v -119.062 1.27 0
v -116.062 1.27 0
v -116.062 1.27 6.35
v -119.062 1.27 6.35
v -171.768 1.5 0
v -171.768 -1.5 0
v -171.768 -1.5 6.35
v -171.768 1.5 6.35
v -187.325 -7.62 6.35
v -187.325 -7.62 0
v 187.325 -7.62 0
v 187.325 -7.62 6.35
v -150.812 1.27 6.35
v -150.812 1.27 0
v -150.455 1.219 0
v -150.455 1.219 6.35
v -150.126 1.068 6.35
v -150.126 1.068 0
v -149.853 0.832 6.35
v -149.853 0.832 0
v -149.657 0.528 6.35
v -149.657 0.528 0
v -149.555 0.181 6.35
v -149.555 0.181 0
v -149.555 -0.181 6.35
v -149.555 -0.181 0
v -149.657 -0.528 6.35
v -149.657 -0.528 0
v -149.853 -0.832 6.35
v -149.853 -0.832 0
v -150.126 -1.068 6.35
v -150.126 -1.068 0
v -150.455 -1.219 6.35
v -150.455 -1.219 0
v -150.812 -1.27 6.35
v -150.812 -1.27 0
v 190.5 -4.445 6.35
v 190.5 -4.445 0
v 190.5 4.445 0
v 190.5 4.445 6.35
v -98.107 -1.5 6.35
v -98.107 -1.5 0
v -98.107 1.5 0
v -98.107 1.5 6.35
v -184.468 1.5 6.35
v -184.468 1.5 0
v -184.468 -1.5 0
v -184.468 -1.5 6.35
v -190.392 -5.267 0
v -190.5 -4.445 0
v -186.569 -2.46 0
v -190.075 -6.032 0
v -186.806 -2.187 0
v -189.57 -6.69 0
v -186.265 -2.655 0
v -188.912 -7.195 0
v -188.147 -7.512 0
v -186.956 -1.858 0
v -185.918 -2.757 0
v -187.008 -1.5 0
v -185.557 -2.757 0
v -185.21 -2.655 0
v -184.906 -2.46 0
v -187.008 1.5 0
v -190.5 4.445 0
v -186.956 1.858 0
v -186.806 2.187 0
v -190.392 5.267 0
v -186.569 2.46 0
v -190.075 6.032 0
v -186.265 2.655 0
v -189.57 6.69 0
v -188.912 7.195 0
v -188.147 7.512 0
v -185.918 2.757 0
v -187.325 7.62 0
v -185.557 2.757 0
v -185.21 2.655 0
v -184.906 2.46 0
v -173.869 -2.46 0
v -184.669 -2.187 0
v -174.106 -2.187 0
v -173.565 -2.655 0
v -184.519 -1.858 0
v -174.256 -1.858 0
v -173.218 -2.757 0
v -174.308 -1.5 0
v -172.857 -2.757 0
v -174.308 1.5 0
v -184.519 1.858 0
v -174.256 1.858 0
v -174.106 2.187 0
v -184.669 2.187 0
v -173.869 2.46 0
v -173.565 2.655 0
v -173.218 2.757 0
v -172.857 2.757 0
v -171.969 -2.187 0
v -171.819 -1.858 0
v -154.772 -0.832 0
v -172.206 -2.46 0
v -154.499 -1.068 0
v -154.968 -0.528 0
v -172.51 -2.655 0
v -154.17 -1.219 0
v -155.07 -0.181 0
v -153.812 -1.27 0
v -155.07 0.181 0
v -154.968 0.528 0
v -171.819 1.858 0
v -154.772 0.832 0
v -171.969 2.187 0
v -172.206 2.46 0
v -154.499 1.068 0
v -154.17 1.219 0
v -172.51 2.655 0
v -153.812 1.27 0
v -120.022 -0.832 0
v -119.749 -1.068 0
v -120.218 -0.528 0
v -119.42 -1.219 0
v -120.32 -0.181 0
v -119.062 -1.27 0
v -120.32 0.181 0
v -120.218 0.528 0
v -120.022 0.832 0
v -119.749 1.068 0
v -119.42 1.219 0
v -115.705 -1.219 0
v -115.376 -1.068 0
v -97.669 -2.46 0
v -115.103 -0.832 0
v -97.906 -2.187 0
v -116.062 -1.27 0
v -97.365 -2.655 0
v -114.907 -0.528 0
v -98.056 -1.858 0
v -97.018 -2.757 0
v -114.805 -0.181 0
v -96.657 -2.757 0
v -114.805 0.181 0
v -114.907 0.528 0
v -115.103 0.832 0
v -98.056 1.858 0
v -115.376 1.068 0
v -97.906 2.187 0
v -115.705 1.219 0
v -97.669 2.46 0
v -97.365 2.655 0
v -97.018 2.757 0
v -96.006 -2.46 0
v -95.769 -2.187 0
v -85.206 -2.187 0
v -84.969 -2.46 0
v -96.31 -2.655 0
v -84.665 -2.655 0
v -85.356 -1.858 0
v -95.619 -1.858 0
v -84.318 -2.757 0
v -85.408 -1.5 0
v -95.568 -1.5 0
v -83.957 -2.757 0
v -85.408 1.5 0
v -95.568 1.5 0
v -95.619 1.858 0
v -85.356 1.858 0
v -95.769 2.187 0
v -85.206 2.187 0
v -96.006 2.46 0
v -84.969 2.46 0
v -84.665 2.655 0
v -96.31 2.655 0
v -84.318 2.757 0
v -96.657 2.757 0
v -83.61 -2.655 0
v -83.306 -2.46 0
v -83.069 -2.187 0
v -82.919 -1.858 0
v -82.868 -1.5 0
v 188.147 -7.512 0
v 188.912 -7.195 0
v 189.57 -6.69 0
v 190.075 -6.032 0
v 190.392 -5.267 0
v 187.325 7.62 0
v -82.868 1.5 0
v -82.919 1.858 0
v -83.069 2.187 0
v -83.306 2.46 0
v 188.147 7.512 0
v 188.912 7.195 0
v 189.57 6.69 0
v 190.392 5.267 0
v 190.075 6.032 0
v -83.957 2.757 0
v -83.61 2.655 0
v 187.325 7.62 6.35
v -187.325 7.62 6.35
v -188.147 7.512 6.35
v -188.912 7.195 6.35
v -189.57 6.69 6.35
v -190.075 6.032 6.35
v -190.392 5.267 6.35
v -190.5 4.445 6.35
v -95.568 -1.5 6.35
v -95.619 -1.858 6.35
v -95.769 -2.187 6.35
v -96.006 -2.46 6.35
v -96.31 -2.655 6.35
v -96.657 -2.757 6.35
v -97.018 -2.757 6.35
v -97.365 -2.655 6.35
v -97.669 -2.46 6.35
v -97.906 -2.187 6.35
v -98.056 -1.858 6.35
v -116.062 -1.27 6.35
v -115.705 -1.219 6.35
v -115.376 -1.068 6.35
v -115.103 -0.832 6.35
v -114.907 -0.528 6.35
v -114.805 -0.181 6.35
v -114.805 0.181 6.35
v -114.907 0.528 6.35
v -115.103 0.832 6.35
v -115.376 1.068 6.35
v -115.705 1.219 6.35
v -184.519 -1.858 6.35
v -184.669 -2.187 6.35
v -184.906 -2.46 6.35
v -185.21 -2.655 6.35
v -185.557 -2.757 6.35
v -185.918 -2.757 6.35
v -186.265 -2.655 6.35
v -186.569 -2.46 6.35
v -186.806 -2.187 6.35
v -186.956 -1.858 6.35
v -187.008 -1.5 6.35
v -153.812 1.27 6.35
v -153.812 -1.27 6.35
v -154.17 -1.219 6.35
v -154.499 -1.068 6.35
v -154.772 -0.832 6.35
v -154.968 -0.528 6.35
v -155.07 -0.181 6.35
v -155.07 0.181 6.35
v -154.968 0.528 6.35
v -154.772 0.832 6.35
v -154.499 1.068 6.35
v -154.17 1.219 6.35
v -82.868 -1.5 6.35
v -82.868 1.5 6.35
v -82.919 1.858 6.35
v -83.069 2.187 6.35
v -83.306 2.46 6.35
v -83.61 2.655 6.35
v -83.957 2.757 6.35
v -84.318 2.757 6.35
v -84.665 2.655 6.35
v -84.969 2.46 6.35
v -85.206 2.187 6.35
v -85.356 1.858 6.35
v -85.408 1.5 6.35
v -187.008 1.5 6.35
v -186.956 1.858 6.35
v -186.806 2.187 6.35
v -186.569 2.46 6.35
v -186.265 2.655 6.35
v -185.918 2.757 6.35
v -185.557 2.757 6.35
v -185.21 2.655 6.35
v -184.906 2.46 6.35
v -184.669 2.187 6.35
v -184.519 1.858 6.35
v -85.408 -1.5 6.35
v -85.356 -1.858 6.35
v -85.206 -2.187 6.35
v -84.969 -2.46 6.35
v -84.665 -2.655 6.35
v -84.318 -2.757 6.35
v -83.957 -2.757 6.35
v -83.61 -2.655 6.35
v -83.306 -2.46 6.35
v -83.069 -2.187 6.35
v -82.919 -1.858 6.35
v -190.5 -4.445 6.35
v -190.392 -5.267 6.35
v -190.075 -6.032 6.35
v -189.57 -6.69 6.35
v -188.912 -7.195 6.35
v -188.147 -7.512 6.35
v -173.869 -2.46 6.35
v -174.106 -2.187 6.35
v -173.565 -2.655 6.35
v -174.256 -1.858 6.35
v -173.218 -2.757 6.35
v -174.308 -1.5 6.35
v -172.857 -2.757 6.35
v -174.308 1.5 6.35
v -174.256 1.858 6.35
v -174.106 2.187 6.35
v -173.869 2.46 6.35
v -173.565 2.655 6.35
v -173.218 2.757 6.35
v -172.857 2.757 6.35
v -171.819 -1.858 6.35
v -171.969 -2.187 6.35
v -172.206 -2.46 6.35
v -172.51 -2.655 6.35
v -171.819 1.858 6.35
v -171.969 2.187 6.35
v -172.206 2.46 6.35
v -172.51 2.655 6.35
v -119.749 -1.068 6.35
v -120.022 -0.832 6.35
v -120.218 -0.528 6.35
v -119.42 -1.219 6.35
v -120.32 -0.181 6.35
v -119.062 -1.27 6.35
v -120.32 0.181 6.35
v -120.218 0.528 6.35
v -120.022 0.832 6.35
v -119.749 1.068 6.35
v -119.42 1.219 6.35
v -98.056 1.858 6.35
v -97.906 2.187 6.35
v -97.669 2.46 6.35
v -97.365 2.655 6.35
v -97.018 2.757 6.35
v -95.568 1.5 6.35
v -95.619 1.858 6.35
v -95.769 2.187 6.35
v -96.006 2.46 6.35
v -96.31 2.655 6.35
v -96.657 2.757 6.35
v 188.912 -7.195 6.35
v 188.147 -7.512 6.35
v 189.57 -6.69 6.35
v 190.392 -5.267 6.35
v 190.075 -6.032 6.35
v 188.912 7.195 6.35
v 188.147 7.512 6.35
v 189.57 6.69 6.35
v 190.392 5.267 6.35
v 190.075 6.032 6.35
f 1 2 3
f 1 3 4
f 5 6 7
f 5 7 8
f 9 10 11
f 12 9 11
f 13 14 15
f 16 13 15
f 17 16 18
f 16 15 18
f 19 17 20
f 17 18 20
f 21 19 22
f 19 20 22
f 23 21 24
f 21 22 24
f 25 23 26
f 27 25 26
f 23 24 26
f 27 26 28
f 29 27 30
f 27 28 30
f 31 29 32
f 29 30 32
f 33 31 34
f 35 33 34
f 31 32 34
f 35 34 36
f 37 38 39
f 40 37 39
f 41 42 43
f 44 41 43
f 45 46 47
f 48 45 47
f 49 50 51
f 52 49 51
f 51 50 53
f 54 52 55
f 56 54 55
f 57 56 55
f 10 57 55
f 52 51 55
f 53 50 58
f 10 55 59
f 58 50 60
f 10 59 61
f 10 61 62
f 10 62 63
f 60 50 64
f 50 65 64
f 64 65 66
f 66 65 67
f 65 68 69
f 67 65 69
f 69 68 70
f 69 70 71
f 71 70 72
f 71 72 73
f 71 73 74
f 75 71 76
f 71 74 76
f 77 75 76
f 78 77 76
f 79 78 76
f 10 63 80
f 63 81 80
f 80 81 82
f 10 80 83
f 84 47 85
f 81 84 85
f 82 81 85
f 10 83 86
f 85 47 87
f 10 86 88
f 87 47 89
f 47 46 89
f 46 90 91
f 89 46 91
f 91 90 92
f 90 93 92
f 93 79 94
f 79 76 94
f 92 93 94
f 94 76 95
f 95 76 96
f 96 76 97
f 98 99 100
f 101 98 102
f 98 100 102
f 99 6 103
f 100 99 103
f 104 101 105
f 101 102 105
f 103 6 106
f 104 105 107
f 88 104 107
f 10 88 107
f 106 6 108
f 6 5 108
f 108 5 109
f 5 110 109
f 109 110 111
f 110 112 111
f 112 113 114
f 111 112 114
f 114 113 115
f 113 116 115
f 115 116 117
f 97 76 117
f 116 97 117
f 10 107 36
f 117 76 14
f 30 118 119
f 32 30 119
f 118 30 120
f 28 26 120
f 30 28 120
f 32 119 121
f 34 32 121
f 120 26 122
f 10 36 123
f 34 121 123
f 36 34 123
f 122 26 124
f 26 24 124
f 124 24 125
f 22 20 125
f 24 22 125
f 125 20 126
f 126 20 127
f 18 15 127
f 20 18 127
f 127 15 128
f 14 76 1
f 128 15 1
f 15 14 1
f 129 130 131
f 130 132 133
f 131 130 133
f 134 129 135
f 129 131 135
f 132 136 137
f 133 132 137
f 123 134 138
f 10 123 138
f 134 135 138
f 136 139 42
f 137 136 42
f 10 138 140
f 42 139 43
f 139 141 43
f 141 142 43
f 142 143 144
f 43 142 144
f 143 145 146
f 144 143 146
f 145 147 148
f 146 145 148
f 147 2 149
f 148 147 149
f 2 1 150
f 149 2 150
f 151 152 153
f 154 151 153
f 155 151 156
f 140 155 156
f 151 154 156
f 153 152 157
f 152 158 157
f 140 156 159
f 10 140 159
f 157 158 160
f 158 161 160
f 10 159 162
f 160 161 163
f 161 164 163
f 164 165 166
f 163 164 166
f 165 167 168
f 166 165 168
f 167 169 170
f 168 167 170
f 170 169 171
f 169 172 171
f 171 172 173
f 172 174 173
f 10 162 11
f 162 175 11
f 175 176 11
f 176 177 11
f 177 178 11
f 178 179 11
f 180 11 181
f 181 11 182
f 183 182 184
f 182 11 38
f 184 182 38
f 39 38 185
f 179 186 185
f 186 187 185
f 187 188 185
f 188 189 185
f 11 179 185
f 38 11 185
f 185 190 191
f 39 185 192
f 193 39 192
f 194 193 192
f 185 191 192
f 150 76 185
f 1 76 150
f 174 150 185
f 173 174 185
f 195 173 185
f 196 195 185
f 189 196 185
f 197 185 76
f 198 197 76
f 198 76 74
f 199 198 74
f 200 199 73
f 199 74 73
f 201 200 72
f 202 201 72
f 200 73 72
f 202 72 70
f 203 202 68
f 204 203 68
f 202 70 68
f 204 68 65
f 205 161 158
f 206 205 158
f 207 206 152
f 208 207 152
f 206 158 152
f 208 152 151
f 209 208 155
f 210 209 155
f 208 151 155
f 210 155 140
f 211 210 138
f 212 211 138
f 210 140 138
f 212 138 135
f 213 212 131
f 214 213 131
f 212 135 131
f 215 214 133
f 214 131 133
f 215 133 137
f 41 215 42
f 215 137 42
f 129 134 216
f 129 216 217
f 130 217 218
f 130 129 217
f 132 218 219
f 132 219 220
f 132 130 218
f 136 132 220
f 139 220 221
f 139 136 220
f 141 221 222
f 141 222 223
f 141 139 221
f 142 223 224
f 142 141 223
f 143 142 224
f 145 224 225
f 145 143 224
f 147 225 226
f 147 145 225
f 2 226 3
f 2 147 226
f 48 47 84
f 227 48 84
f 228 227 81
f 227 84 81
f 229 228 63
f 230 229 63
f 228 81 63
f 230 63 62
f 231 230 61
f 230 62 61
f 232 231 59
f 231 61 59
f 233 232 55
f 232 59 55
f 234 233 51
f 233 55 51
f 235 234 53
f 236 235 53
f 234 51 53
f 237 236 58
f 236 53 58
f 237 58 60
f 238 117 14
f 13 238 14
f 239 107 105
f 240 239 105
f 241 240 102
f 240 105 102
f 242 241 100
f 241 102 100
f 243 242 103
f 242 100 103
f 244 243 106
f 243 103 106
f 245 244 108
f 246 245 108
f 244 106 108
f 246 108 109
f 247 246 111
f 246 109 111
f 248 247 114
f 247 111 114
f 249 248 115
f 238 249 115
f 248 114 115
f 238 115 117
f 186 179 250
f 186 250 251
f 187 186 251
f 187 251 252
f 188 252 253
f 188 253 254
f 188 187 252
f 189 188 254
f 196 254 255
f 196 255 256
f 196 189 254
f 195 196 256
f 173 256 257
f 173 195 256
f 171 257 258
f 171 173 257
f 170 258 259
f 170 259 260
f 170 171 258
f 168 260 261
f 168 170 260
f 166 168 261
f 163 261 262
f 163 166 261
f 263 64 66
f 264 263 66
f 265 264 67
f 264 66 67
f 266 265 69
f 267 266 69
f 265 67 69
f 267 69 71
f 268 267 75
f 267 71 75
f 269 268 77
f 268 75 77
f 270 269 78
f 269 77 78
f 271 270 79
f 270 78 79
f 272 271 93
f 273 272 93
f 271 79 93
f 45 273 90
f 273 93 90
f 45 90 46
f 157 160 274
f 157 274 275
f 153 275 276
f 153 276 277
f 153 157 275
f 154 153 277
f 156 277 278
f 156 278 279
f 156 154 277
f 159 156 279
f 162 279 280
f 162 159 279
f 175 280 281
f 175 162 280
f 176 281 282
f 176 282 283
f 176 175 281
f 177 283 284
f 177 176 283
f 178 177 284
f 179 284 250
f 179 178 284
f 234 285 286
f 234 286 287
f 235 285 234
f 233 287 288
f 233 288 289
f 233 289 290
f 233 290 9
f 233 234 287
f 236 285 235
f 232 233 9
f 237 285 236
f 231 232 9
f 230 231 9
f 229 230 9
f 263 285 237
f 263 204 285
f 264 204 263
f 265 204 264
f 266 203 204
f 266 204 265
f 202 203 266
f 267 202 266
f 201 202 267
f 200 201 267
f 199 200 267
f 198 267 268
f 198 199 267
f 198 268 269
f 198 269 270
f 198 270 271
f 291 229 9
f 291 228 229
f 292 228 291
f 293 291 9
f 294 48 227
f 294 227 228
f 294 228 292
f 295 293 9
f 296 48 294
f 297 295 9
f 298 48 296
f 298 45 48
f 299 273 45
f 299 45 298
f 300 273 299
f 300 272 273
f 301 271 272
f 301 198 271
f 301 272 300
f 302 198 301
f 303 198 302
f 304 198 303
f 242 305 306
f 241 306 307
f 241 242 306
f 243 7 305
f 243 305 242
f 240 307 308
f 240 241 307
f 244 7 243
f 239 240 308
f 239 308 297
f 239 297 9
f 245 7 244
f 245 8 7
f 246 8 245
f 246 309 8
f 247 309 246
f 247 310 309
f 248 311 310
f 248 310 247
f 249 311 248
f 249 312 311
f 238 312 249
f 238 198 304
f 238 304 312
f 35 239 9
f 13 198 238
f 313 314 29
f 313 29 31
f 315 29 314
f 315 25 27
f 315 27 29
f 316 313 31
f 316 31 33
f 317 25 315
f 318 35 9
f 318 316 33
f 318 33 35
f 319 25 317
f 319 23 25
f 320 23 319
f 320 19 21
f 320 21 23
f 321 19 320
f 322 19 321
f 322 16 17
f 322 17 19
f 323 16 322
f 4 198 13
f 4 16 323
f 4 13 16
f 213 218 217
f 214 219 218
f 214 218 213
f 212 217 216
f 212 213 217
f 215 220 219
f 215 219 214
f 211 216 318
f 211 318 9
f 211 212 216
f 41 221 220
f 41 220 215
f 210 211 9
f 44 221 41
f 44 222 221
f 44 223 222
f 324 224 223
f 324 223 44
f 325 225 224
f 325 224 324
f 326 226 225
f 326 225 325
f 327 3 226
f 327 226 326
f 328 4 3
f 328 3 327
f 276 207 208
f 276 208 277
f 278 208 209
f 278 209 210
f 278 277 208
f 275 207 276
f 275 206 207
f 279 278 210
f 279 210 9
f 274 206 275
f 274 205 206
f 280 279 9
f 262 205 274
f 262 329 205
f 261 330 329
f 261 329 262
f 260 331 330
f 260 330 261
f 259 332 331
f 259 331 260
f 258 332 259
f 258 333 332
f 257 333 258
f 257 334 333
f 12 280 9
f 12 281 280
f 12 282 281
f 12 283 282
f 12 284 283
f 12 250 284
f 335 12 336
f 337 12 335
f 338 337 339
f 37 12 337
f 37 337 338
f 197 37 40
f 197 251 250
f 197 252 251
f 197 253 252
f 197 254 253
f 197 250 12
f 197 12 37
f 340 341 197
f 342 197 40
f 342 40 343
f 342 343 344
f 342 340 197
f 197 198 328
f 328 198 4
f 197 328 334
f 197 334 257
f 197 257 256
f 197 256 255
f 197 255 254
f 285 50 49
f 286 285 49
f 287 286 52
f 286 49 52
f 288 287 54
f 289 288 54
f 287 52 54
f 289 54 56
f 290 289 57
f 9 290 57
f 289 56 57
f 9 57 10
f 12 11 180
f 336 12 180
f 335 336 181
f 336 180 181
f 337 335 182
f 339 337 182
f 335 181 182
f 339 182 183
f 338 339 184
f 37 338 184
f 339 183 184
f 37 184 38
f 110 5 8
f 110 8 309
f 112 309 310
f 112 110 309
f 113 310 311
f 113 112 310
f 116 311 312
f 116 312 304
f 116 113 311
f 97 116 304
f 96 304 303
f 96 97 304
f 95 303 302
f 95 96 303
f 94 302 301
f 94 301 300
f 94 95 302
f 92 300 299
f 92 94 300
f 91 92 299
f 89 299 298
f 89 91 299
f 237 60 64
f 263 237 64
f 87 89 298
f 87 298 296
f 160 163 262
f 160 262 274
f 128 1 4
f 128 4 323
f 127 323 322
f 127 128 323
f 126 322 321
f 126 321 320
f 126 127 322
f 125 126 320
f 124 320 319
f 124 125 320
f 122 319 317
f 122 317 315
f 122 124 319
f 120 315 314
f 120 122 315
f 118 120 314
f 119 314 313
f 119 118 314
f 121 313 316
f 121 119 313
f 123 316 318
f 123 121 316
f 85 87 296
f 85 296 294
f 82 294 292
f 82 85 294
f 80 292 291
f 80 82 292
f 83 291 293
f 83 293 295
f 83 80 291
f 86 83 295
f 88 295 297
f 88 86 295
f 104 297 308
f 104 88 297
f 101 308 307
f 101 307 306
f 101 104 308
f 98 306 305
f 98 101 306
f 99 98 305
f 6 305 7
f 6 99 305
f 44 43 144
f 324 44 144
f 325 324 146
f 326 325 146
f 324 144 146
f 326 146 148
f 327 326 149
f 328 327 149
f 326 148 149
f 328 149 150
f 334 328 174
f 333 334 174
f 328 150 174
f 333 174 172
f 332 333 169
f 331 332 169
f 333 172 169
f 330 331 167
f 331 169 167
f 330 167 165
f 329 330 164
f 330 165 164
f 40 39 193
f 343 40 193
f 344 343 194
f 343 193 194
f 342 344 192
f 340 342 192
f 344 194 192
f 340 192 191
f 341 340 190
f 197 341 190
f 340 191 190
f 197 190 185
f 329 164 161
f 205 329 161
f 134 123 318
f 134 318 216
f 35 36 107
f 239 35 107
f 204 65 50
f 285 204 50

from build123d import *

# Parameters (mm, degrees)
SALIENTE_EXTRUIR1_DEPTH = 6.35


with BuildPart() as part:
    # Croquis1 → Saliente-Extruir1 (new body)
    with BuildSketch(Plane.XY):
        with BuildLine():
            Line((-187.325, -7.62), (187.325, -7.62))
            ThreePointArc((187.325, -7.62), (189.57006403, -6.69006403), (190.5, -4.445))
            Line((190.5, -4.445), (190.5, 4.445))
            ThreePointArc((190.5, 4.445), (189.57006403, 6.69006403), (187.325, 7.62))
            Line((187.325, 7.62), (-187.325, 7.62))
            ThreePointArc((-187.325, 7.62), (-189.57006403, 6.69006403), (-190.5, 4.445))
            Line((-190.5, 4.445), (-190.5, -4.445))
            ThreePointArc((-190.5, -4.445), (-189.57006403, -6.69006403), (-187.325, -7.62))
        make_face()
        with BuildLine():
            Line((-187.0075, -1.5), (-187.0075, 1.5))
            ThreePointArc((-187.0075, 1.5), (-185.7375, 2.77), (-184.4675, 1.5))
            Line((-184.4675, 1.5), (-184.4675, -1.5))
            ThreePointArc((-184.4675, -1.5), (-185.7375, -2.77), (-187.0075, -1.5))
        make_face(mode=Mode.SUBTRACT)
        with BuildLine():
            Line((-98.1075, -1.5), (-98.1075, 1.5))
            ThreePointArc((-98.1075, 1.5), (-96.8375, 2.77), (-95.5675, 1.5))
            Line((-95.5675, 1.5), (-95.5675, -1.5))
            ThreePointArc((-95.5675, -1.5), (-96.8375, -2.77), (-98.1075, -1.5))
        make_face(mode=Mode.SUBTRACT)
        with BuildLine():
            Line((-171.7675, -1.5), (-171.7675, 1.5))
            ThreePointArc((-171.7675, 1.5), (-173.0375, 2.77), (-174.3075, 1.5))
            Line((-174.3075, 1.5), (-174.3075, -1.5))
            ThreePointArc((-174.3075, -1.5), (-173.0375, -2.77), (-171.7675, -1.5))
        make_face(mode=Mode.SUBTRACT)
        with BuildLine():
            Line((-82.8675, -1.5), (-82.8675, 1.5))
            ThreePointArc((-82.8675, 1.5), (-84.1375, 2.77), (-85.4075, 1.5))
            Line((-85.4075, 1.5), (-85.4075, -1.5))
            ThreePointArc((-85.4075, -1.5), (-84.1375, -2.77), (-82.8675, -1.5))
        make_face(mode=Mode.SUBTRACT)
        with BuildLine():
            Line((-153.8125, 1.27), (-150.8125, 1.27))
            ThreePointArc((-150.8125, 1.27), (-149.5425, 0), (-150.8125, -1.27))
            Line((-150.8125, -1.27), (-153.8125, -1.27))
            ThreePointArc((-153.8125, -1.27), (-155.0825, 0), (-153.8125, 1.27))
        make_face(mode=Mode.SUBTRACT)
        with BuildLine():
            Line((-116.0625, 1.27), (-119.0625, 1.27))
            ThreePointArc((-119.0625, 1.27), (-120.3325, 0), (-119.0625, -1.27))
            Line((-119.0625, -1.27), (-116.0625, -1.27))
            ThreePointArc((-116.0625, -1.27), (-114.7925, 0), (-116.0625, 1.27))
        make_face(mode=Mode.SUBTRACT)
    extrude(amount=SALIENTE_EXTRUIR1_DEPTH)


solid = part.part
